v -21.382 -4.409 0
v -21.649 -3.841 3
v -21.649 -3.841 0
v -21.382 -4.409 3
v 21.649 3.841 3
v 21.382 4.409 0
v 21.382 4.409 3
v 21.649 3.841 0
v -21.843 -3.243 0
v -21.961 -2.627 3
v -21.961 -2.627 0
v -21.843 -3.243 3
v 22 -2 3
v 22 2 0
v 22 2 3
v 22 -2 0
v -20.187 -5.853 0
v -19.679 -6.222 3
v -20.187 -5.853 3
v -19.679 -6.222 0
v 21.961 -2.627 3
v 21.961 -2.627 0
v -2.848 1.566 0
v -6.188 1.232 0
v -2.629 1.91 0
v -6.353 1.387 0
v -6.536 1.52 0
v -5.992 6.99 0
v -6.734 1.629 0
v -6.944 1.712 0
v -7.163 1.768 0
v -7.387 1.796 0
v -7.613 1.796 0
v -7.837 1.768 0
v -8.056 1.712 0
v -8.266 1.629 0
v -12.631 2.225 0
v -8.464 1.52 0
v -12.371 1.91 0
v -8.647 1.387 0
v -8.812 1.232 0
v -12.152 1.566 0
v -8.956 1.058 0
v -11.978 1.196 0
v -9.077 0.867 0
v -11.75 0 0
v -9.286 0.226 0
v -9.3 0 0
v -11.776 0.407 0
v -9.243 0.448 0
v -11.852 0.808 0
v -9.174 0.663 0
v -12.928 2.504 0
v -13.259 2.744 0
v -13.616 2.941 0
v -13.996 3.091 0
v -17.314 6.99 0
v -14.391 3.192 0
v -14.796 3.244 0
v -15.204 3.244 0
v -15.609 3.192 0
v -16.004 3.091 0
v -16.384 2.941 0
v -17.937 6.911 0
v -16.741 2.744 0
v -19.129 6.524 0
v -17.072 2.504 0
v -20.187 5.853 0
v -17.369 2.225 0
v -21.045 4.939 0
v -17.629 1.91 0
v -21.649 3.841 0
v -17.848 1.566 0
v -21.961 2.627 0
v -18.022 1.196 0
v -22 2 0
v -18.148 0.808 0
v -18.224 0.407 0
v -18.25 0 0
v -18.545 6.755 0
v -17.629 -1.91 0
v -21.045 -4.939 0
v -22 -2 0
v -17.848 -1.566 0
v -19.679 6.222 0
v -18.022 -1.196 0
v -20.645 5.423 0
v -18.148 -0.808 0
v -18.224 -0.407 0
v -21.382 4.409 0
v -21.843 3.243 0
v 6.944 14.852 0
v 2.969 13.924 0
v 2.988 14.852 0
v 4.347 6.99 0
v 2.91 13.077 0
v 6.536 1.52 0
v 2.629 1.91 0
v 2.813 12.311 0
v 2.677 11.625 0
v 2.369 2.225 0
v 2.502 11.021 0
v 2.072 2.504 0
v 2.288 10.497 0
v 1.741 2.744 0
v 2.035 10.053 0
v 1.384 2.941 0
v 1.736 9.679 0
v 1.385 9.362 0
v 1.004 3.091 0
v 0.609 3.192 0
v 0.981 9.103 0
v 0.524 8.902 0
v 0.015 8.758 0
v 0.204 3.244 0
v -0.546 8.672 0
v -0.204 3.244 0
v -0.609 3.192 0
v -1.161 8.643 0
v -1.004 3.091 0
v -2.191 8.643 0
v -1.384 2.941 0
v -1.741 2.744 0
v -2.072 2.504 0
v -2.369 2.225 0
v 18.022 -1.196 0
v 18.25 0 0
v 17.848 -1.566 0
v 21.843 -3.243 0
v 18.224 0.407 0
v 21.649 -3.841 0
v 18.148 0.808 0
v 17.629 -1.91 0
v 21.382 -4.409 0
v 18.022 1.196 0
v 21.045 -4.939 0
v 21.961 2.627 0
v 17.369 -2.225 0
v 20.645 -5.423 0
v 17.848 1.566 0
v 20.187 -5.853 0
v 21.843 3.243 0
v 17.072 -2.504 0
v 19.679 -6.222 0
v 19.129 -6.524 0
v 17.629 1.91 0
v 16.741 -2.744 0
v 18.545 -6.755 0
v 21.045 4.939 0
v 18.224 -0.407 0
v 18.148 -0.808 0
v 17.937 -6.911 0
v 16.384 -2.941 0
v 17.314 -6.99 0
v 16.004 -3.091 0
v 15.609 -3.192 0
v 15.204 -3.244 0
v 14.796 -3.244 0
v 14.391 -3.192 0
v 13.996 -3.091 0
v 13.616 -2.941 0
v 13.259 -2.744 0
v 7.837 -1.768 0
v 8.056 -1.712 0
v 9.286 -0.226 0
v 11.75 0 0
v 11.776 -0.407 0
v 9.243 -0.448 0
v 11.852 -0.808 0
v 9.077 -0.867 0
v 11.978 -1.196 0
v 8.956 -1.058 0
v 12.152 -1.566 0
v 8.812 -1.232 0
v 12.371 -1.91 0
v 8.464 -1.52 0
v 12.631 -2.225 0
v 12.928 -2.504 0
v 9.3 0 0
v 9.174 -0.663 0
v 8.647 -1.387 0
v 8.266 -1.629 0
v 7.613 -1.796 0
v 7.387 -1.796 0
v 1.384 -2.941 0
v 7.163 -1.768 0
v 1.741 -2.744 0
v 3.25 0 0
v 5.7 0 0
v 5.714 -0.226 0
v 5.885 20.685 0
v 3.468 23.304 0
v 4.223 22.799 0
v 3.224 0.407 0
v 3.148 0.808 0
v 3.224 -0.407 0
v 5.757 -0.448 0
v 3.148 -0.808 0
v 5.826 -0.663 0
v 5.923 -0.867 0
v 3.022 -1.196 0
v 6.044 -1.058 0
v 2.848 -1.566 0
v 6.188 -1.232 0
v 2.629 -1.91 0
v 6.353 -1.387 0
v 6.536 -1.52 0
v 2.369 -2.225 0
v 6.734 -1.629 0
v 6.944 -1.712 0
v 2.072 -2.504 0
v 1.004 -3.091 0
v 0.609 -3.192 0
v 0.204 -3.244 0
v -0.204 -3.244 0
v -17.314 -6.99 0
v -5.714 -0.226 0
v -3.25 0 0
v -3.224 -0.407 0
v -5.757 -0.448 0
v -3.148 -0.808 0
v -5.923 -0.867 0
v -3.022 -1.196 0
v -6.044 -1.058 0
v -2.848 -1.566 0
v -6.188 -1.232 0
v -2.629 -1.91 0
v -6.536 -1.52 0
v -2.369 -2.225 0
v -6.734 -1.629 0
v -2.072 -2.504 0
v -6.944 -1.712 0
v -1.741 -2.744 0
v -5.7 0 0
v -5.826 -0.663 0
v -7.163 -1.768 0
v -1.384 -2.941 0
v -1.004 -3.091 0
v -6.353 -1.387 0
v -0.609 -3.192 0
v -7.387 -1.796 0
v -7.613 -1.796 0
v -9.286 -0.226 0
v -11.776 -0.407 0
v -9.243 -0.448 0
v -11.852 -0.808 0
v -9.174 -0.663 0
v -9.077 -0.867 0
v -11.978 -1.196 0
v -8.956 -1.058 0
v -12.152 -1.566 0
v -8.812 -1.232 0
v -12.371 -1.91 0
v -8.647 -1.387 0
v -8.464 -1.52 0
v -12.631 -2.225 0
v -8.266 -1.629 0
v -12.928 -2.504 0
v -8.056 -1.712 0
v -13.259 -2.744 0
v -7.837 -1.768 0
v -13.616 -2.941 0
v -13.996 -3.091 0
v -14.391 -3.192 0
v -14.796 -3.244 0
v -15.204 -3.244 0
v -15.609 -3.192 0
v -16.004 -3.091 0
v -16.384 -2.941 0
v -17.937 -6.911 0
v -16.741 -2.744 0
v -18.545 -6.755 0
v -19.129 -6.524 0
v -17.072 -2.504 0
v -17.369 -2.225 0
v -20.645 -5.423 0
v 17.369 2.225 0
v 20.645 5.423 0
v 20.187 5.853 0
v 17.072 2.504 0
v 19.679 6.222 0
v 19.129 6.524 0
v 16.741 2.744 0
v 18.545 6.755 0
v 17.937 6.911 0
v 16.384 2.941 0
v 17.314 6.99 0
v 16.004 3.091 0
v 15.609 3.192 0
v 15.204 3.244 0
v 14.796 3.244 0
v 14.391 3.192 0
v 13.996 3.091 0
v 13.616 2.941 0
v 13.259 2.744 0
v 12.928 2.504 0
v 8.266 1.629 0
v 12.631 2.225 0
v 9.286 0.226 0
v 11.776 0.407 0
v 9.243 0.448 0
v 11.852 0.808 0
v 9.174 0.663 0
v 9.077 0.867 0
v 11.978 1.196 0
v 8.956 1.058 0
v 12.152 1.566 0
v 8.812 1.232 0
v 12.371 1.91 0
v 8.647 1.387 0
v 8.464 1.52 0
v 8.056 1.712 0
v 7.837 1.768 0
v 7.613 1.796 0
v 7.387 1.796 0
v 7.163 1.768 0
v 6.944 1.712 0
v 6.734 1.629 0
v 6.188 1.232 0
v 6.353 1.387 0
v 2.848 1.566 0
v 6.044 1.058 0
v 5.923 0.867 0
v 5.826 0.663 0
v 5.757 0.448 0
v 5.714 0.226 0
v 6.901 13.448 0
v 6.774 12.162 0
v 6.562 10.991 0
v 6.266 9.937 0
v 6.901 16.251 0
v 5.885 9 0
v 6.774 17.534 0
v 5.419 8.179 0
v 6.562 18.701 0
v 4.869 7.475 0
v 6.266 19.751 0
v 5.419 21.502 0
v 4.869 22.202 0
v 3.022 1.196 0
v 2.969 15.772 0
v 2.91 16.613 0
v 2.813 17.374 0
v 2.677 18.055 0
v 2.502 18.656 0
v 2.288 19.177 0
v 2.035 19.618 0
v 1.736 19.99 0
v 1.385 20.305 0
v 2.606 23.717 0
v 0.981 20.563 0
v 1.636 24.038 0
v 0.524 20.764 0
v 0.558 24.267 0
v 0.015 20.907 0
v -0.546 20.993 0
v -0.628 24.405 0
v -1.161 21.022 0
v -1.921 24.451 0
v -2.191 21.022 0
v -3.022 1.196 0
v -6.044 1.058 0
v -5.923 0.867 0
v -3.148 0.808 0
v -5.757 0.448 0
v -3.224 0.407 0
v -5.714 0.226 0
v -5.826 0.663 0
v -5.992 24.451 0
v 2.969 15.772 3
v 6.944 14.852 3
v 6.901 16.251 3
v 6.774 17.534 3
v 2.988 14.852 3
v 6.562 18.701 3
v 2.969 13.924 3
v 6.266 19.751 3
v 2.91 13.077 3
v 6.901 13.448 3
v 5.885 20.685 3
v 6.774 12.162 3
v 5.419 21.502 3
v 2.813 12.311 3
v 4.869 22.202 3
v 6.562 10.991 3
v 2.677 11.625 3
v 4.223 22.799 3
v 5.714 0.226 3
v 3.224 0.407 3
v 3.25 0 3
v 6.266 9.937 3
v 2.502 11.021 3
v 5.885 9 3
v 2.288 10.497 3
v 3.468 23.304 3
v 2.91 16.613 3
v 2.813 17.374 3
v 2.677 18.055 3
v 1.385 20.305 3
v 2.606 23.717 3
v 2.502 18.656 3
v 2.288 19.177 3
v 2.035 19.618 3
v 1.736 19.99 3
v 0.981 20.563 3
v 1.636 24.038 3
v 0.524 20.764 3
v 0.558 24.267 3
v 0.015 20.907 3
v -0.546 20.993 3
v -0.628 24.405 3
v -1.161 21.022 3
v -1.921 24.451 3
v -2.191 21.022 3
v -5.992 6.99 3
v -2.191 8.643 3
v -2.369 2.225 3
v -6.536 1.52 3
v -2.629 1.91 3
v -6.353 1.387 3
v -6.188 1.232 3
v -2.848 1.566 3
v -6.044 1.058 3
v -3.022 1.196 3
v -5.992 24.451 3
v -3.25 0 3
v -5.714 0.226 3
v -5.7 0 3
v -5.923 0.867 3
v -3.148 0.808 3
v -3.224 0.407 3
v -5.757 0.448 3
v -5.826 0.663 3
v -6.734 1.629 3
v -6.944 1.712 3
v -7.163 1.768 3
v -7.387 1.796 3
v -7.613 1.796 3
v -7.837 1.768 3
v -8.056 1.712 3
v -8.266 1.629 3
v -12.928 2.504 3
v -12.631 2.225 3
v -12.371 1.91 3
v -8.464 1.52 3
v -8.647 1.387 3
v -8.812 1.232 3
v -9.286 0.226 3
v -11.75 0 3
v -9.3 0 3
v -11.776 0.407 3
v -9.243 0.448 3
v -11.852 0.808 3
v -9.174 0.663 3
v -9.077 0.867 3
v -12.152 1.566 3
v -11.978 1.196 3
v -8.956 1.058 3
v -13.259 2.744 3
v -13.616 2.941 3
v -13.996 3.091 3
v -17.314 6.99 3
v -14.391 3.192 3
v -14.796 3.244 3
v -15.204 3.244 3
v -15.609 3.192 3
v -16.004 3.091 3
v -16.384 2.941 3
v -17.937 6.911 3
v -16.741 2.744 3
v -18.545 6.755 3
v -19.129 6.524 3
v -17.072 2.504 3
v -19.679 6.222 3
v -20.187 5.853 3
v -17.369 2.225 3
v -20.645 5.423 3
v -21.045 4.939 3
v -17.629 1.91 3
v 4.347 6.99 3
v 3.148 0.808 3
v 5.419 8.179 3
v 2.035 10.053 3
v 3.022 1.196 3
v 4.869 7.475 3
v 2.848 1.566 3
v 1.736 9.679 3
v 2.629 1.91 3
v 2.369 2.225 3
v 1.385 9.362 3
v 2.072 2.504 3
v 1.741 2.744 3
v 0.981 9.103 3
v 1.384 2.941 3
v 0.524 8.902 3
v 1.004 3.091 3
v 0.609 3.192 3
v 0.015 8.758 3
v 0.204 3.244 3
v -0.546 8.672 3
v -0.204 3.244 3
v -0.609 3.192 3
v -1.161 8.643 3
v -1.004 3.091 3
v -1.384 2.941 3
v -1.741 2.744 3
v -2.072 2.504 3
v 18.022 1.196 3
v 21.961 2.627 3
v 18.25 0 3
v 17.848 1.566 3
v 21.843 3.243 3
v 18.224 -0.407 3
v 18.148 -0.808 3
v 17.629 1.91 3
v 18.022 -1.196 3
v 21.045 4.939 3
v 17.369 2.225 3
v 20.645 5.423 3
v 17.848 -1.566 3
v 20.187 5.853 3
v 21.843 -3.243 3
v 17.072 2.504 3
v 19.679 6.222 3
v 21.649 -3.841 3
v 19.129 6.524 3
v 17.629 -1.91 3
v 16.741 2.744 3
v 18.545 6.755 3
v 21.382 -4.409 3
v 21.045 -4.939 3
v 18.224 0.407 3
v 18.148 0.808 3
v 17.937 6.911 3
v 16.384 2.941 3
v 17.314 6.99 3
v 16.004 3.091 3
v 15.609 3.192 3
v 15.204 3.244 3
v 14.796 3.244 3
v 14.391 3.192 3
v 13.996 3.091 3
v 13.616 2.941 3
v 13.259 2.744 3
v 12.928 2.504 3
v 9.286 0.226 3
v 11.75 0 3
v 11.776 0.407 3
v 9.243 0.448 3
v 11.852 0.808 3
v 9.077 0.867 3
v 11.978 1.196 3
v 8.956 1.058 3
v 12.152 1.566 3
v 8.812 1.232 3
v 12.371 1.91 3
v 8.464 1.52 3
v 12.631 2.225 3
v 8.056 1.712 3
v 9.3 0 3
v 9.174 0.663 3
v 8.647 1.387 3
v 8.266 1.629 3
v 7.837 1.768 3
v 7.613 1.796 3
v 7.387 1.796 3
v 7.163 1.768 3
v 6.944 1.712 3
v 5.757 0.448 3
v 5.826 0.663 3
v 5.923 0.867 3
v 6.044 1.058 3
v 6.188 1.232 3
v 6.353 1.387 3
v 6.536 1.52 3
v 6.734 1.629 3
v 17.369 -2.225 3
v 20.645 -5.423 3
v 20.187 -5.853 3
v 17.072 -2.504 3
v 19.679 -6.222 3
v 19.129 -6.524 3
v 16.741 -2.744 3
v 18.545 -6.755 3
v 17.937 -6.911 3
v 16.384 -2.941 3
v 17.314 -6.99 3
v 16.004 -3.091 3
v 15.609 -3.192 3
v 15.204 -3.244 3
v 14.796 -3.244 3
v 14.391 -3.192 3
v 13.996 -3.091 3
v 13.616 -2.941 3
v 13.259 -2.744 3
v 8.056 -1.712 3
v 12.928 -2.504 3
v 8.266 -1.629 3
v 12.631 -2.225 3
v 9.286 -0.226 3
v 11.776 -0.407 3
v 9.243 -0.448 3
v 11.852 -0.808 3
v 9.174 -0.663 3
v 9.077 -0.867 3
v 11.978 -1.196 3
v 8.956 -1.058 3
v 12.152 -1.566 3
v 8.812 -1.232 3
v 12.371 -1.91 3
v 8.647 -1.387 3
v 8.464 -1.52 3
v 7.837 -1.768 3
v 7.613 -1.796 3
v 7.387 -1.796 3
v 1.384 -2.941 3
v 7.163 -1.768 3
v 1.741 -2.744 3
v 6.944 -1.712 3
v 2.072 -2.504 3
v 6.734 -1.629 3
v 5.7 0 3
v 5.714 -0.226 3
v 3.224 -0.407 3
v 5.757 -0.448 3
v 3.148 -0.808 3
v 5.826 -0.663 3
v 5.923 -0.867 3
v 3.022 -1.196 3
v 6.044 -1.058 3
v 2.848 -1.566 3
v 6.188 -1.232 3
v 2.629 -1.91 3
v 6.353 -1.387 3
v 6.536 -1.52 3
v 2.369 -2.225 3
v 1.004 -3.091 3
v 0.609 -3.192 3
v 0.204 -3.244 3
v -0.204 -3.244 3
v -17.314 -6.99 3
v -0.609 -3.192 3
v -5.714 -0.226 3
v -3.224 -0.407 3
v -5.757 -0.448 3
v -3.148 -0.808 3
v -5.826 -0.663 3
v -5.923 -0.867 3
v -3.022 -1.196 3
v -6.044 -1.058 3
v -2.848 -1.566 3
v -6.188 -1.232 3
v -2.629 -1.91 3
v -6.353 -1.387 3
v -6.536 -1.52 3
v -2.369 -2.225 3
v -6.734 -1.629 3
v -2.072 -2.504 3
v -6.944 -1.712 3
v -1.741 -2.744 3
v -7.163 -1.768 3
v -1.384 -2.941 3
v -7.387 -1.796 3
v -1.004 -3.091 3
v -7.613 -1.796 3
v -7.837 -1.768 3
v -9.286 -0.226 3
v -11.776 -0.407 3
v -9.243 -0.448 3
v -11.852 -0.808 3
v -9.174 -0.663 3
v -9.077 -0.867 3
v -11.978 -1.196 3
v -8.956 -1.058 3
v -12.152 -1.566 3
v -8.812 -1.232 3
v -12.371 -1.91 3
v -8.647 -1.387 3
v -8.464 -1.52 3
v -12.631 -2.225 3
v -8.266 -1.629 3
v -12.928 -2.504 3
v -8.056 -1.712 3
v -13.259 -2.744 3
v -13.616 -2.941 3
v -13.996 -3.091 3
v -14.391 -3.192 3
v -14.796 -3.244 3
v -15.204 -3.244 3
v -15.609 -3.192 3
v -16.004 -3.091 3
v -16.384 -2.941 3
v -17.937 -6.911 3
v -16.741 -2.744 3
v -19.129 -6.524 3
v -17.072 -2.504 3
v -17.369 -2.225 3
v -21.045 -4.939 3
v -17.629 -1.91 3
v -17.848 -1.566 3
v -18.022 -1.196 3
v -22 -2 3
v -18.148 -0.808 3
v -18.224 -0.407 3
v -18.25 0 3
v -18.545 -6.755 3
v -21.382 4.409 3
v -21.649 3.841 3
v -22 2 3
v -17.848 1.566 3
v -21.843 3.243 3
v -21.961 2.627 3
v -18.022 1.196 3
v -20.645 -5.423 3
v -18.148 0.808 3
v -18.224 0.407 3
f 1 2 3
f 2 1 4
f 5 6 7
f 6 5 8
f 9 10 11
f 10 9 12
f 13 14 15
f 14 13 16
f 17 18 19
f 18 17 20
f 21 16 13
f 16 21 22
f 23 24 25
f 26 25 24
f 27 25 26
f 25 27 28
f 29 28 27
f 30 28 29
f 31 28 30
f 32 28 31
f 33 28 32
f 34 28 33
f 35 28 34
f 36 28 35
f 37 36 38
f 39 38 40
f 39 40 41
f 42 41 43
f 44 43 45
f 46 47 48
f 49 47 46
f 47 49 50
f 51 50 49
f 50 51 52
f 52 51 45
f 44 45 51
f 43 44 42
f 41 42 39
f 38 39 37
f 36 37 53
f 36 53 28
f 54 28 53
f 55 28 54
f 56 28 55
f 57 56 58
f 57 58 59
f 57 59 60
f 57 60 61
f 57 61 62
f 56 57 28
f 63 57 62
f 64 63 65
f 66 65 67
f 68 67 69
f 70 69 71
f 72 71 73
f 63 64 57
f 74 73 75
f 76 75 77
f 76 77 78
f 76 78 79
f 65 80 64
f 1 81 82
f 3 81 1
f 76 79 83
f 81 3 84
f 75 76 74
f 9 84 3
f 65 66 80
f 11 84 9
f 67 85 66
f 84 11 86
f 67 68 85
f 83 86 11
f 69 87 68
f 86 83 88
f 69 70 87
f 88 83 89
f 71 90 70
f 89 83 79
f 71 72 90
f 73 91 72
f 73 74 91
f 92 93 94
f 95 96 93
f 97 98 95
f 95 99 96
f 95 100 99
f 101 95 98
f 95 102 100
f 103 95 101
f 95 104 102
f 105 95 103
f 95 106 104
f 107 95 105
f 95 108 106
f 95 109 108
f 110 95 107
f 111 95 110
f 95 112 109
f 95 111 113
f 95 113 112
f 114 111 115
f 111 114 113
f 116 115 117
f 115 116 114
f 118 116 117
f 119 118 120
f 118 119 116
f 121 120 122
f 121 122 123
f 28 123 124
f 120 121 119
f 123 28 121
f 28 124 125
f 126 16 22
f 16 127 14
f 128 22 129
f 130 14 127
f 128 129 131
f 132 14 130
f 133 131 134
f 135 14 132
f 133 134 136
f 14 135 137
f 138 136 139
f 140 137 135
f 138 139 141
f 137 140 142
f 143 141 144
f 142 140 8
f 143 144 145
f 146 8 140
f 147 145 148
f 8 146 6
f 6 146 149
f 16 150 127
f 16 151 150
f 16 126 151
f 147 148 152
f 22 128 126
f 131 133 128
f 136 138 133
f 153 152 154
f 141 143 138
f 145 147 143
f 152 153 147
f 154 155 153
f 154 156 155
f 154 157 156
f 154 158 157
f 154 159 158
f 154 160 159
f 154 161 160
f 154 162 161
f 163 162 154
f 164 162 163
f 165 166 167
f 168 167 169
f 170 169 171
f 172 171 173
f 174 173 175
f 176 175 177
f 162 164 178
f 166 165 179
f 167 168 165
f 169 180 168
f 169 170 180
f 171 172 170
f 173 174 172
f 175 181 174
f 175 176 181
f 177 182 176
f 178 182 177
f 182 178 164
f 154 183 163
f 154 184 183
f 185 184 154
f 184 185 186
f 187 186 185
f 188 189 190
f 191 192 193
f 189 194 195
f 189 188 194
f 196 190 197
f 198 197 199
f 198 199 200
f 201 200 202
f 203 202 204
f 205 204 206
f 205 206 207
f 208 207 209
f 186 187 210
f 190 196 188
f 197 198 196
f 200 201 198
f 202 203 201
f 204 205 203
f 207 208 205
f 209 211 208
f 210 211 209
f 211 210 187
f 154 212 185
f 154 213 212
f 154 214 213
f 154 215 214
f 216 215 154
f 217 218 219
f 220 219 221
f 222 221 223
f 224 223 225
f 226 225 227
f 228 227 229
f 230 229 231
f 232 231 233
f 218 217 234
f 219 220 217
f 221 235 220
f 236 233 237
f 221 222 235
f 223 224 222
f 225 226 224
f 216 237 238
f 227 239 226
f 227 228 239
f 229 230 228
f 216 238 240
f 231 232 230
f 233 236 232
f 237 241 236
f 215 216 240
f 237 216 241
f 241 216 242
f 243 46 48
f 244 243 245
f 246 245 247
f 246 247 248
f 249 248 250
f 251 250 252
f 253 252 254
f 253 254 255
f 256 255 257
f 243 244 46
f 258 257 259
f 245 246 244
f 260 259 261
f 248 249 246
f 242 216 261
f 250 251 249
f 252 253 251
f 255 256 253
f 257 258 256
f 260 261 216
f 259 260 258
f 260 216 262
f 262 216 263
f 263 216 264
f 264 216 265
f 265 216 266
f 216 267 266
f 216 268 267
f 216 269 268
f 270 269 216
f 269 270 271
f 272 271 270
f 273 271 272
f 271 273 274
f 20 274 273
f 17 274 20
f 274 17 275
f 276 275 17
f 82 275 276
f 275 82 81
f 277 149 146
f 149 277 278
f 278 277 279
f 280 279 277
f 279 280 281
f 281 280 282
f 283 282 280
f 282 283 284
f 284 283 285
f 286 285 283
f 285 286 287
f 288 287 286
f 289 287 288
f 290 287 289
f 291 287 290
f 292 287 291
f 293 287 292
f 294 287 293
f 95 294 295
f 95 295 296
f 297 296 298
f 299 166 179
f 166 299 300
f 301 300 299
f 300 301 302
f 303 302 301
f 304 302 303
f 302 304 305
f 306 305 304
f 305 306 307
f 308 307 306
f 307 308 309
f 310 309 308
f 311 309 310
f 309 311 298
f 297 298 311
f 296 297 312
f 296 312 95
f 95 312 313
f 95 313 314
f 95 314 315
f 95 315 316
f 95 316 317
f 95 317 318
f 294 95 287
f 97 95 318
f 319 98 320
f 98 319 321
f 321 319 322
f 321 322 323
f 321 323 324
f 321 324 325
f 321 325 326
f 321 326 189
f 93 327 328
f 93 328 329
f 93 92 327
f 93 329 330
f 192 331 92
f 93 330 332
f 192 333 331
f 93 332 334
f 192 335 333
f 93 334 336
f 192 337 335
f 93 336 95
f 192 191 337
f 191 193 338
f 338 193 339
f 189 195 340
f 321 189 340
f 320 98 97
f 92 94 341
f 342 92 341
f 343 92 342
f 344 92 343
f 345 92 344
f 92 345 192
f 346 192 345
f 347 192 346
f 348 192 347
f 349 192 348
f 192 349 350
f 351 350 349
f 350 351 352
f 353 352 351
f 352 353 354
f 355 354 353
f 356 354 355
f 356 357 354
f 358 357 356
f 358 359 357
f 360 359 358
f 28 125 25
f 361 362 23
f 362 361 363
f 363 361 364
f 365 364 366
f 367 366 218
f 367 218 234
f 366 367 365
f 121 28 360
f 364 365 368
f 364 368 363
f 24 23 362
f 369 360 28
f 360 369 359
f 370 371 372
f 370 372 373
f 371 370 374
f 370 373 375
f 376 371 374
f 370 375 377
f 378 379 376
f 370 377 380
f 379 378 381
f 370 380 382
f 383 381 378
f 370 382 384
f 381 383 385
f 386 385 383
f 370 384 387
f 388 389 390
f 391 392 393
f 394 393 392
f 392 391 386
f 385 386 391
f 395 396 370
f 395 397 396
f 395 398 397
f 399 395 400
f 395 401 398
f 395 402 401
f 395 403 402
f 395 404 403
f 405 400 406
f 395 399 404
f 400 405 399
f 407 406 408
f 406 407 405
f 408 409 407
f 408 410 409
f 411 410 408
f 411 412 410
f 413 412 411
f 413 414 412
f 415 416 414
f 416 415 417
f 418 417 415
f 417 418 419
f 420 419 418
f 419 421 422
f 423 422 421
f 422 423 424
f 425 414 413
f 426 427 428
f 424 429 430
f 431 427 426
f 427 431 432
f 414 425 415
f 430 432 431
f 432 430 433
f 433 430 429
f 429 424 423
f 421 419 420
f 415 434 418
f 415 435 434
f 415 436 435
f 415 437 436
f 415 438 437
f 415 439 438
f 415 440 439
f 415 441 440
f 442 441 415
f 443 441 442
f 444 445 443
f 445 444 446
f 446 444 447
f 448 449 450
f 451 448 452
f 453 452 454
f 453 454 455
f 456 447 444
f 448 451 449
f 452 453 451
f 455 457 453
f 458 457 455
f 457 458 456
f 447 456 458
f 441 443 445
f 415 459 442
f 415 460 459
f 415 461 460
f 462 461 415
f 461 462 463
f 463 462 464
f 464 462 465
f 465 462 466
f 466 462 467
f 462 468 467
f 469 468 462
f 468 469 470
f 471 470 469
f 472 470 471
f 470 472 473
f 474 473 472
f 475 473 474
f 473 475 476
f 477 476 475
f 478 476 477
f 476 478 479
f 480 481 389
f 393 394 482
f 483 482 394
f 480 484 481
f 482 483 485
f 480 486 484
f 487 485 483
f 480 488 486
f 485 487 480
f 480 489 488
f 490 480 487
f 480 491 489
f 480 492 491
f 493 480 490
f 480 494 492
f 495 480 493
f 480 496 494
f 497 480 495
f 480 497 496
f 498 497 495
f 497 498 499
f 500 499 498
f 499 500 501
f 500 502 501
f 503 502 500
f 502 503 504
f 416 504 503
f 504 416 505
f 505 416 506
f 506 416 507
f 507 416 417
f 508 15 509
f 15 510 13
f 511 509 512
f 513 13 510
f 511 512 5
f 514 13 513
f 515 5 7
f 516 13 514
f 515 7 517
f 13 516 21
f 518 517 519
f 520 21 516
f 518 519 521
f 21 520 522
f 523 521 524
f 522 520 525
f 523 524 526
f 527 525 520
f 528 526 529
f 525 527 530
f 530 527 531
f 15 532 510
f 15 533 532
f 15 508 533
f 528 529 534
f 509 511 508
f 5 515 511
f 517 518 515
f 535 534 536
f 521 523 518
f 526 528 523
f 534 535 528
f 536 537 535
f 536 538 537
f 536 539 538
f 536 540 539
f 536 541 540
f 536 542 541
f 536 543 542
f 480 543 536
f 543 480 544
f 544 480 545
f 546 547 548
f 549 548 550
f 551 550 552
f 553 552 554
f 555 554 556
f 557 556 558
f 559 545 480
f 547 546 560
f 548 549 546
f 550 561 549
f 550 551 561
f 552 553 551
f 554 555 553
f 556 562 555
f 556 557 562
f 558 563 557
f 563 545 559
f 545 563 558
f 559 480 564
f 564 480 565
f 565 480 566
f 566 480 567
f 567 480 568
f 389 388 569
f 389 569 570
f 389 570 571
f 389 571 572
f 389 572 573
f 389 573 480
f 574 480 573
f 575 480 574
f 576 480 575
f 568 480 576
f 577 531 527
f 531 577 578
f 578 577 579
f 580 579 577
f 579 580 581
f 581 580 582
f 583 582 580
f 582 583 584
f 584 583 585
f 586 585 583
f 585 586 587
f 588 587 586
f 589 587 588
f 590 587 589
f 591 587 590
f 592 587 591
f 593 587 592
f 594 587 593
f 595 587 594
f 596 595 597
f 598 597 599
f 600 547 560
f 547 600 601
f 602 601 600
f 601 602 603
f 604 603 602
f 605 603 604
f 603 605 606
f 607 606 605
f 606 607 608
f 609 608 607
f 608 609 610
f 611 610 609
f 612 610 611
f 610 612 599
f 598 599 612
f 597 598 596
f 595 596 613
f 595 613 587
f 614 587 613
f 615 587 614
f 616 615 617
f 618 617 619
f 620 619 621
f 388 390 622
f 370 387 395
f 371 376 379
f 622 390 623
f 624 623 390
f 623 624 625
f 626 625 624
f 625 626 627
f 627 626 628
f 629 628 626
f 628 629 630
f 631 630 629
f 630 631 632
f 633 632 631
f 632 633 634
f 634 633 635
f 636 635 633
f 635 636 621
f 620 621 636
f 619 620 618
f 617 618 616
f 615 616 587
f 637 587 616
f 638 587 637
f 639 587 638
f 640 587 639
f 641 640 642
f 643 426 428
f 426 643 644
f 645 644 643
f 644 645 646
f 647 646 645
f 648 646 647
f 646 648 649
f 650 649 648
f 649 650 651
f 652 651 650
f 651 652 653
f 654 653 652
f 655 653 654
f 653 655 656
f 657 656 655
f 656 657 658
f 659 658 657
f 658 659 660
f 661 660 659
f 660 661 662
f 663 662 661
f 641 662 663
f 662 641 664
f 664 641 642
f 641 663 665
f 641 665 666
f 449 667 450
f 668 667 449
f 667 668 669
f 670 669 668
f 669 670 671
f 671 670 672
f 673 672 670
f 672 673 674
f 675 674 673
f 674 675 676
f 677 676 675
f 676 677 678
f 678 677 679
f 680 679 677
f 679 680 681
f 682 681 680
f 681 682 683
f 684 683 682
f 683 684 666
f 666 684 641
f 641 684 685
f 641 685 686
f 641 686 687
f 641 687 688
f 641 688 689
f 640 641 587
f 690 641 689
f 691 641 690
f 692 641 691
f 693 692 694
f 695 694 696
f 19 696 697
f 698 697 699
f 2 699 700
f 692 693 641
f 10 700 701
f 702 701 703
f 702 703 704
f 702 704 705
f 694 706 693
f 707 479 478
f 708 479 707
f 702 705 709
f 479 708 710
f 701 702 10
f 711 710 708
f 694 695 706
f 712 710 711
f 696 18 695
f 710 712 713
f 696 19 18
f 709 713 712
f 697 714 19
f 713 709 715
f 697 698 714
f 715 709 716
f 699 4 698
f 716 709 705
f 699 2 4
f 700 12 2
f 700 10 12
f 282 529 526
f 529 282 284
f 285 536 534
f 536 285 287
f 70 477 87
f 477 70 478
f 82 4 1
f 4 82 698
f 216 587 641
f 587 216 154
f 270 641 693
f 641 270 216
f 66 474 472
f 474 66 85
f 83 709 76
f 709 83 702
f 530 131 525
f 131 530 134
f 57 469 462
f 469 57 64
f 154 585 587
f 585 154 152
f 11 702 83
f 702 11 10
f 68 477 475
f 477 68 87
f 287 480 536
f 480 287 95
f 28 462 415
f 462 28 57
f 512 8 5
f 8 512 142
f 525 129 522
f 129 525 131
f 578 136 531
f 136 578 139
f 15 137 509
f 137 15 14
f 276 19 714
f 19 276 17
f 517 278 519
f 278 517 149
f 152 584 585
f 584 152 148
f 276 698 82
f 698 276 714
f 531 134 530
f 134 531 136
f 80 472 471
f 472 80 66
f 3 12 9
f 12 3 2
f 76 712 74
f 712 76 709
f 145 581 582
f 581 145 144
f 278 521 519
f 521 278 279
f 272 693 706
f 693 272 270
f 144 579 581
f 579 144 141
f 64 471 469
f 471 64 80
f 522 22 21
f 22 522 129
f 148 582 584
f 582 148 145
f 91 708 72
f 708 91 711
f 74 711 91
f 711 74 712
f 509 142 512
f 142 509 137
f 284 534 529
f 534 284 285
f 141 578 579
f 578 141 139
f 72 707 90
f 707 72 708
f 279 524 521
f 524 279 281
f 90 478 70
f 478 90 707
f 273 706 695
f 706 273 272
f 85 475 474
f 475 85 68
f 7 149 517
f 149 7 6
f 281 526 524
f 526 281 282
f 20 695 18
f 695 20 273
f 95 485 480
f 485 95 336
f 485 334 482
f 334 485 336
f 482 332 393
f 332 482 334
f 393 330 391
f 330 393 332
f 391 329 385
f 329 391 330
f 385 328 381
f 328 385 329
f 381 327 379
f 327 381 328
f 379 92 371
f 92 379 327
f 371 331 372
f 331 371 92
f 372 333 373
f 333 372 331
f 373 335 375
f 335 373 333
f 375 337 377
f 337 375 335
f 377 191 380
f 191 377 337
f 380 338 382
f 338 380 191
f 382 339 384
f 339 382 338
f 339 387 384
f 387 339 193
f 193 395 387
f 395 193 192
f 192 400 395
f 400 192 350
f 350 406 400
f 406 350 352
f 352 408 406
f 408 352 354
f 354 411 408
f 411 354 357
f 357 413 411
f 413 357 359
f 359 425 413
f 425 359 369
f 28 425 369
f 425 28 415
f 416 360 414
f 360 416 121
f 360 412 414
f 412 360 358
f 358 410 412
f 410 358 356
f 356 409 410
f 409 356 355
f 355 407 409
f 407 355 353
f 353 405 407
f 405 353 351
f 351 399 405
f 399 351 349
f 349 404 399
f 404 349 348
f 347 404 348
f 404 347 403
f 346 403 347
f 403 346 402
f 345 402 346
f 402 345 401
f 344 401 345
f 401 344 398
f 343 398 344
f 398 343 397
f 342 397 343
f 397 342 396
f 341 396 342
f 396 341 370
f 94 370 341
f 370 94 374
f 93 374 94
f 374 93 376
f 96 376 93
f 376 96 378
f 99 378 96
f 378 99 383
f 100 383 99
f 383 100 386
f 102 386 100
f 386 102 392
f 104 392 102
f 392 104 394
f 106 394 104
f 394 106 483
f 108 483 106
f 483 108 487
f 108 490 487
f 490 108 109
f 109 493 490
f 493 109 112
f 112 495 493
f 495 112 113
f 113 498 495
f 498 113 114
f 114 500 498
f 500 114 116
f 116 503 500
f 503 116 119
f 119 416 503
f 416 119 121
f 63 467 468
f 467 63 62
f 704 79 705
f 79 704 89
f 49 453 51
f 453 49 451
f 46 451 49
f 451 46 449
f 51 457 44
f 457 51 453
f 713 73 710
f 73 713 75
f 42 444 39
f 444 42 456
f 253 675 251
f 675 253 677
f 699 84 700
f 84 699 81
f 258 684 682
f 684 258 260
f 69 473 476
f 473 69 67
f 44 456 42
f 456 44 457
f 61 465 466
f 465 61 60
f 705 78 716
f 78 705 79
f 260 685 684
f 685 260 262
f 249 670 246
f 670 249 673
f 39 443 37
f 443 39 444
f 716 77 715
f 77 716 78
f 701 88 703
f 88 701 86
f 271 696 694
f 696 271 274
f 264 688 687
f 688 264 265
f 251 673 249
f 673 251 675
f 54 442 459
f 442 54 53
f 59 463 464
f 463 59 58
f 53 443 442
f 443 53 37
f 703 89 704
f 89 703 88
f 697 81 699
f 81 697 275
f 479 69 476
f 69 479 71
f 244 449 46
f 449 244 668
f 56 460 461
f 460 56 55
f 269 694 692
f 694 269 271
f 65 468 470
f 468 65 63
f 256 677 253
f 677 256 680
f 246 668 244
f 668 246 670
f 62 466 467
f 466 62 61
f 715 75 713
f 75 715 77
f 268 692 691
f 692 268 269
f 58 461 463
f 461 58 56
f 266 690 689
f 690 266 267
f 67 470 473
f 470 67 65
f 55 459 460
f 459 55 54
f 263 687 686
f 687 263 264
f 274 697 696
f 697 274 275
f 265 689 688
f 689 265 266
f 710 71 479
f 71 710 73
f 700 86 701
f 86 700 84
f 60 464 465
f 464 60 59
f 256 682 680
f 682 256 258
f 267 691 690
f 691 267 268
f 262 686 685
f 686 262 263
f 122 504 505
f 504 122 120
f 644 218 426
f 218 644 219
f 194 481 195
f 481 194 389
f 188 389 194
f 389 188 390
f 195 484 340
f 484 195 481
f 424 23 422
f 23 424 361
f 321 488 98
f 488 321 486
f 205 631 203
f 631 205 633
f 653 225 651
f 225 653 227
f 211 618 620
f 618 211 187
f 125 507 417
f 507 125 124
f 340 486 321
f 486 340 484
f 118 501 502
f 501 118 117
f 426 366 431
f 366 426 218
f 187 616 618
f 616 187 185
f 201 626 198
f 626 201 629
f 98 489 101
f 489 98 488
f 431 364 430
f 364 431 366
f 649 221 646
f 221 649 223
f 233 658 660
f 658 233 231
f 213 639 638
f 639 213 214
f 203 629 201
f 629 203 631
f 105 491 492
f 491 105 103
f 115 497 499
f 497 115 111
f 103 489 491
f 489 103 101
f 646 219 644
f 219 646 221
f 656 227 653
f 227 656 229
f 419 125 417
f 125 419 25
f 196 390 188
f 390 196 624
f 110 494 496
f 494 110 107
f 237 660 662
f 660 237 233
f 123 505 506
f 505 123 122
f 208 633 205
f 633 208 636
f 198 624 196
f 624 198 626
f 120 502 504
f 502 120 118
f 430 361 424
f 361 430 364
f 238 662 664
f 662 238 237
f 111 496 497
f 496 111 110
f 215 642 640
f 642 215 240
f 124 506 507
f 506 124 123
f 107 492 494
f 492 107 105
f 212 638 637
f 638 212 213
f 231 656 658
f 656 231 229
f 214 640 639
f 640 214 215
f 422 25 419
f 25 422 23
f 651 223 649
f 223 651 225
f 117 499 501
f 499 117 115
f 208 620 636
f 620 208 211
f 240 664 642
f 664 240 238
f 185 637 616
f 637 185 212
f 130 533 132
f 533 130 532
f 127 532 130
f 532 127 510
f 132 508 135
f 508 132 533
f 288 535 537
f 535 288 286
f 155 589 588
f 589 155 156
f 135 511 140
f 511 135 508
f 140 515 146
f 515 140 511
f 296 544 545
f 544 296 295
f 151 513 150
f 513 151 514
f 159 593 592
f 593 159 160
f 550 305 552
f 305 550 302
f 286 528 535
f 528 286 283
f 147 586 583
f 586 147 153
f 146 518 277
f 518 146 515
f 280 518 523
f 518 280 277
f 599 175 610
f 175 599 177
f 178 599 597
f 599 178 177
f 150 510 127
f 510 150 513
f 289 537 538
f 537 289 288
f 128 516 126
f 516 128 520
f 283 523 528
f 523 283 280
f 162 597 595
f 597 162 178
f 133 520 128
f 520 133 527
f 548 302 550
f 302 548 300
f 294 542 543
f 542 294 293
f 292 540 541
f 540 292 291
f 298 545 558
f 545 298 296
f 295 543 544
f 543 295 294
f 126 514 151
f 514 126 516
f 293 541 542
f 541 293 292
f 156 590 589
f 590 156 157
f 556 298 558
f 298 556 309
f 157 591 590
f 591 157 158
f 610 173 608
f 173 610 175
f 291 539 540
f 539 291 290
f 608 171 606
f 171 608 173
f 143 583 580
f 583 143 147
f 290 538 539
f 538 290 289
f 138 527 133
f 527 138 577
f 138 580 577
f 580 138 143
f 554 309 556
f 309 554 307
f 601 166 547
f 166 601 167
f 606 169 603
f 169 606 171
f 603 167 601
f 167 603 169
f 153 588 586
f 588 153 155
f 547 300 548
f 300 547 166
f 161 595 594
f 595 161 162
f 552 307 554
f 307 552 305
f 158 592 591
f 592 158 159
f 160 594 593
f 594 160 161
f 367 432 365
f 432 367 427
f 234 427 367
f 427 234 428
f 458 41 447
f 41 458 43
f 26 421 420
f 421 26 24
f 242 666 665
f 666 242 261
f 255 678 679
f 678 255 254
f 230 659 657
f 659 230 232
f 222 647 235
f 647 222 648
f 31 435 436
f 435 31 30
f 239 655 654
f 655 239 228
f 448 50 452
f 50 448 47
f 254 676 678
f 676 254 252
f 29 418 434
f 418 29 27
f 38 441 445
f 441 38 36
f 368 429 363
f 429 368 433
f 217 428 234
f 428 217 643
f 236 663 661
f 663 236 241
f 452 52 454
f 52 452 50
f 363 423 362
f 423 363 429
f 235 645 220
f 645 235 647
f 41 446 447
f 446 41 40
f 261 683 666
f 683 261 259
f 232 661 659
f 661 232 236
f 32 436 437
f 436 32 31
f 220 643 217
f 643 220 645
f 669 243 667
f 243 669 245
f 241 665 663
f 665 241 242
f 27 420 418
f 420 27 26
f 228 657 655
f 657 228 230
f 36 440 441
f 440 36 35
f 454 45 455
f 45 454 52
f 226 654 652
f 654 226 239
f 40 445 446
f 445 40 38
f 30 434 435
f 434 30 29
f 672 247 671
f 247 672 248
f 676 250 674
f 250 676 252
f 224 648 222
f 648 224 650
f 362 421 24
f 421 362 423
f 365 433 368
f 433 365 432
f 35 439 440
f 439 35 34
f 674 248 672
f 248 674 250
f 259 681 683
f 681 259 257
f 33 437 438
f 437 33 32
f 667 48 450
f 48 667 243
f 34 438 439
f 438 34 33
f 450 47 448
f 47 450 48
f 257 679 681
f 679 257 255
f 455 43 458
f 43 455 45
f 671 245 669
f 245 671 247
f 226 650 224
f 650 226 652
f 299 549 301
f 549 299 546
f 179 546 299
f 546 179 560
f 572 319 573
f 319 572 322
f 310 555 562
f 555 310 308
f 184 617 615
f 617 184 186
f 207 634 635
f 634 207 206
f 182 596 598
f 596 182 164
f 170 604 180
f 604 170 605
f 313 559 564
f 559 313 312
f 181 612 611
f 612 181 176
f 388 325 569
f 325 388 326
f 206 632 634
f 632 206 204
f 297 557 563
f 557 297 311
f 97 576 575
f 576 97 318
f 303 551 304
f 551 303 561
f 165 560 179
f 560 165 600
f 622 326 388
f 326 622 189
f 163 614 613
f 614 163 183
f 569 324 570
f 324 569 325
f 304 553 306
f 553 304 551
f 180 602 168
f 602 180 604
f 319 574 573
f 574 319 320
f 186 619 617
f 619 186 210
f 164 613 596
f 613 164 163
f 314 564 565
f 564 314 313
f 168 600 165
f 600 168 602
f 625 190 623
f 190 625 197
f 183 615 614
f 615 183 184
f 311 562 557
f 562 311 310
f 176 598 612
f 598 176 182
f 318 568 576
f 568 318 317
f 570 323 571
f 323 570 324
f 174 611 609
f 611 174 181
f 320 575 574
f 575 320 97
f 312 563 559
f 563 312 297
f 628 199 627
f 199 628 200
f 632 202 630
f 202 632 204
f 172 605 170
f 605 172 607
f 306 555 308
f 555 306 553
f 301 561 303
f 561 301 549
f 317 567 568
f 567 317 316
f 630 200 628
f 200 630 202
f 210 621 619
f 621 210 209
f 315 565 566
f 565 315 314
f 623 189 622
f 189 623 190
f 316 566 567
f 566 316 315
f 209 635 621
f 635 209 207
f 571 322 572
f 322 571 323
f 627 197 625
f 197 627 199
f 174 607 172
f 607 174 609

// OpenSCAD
$fn = 50;


difference() {
	union() {
		hull() {
			translate(v = [-17.0000000000, 2.0000000000, 0]) {
				cylinder(h = 3, r = 5);
			}
			translate(v = [17.0000000000, 2.0000000000, 0]) {
				cylinder(h = 3, r = 5);
			}
			translate(v = [-17.0000000000, -2.0000000000, 0]) {
				cylinder(h = 3, r = 5);
			}
			translate(v = [17.0000000000, -2.0000000000, 0]) {
				cylinder(h = 3, r = 5);
			}
		}
		translate(v = [0, 24, 0]) {
			linear_extrude(height = 3) {
				text(font = "DejaVu Sans Mono:style=Bold", halign = "center", size = 19.0000000000, text = "D", valign = "top");
			}
		}
	}
	union() {
		translate(v = [-15.0000000000, 0.0000000000, 0]) {
			translate(v = [0, 0, -100]) {
				cylinder(h = 200, r = 3.2500000000);
			}
		}
		translate(v = [0, 0, -100]) {
			cylinder(h = 200, r = 3.2500000000);
		}
		translate(v = [15.0000000000, 0.0000000000, 0]) {
			translate(v = [0, 0, -100]) {
				cylinder(h = 200, r = 3.2500000000);
			}
		}
		translate(v = [-15.0000000000, 0.0000000000, 0]) {
			translate(v = [0, 0, -100]) {
				cylinder(h = 200, r = 1.8000000000);
			}
		}
		translate(v = [-7.5000000000, 0.0000000000, 0]) {
			translate(v = [0, 0, -100]) {
				cylinder(h = 200, r = 1.8000000000);
			}
		}
		translate(v = [0, 0, -100]) {
			cylinder(h = 200, r = 1.8000000000);
		}
		translate(v = [7.5000000000, 0.0000000000, 0]) {
			translate(v = [0, 0, -100]) {
				cylinder(h = 200, r = 1.8000000000);
			}
		}
		translate(v = [15.0000000000, 0.0000000000, 0]) {
			translate(v = [0, 0, -100]) {
				cylinder(h = 200, r = 1.8000000000);
			}
		}
	}
}
